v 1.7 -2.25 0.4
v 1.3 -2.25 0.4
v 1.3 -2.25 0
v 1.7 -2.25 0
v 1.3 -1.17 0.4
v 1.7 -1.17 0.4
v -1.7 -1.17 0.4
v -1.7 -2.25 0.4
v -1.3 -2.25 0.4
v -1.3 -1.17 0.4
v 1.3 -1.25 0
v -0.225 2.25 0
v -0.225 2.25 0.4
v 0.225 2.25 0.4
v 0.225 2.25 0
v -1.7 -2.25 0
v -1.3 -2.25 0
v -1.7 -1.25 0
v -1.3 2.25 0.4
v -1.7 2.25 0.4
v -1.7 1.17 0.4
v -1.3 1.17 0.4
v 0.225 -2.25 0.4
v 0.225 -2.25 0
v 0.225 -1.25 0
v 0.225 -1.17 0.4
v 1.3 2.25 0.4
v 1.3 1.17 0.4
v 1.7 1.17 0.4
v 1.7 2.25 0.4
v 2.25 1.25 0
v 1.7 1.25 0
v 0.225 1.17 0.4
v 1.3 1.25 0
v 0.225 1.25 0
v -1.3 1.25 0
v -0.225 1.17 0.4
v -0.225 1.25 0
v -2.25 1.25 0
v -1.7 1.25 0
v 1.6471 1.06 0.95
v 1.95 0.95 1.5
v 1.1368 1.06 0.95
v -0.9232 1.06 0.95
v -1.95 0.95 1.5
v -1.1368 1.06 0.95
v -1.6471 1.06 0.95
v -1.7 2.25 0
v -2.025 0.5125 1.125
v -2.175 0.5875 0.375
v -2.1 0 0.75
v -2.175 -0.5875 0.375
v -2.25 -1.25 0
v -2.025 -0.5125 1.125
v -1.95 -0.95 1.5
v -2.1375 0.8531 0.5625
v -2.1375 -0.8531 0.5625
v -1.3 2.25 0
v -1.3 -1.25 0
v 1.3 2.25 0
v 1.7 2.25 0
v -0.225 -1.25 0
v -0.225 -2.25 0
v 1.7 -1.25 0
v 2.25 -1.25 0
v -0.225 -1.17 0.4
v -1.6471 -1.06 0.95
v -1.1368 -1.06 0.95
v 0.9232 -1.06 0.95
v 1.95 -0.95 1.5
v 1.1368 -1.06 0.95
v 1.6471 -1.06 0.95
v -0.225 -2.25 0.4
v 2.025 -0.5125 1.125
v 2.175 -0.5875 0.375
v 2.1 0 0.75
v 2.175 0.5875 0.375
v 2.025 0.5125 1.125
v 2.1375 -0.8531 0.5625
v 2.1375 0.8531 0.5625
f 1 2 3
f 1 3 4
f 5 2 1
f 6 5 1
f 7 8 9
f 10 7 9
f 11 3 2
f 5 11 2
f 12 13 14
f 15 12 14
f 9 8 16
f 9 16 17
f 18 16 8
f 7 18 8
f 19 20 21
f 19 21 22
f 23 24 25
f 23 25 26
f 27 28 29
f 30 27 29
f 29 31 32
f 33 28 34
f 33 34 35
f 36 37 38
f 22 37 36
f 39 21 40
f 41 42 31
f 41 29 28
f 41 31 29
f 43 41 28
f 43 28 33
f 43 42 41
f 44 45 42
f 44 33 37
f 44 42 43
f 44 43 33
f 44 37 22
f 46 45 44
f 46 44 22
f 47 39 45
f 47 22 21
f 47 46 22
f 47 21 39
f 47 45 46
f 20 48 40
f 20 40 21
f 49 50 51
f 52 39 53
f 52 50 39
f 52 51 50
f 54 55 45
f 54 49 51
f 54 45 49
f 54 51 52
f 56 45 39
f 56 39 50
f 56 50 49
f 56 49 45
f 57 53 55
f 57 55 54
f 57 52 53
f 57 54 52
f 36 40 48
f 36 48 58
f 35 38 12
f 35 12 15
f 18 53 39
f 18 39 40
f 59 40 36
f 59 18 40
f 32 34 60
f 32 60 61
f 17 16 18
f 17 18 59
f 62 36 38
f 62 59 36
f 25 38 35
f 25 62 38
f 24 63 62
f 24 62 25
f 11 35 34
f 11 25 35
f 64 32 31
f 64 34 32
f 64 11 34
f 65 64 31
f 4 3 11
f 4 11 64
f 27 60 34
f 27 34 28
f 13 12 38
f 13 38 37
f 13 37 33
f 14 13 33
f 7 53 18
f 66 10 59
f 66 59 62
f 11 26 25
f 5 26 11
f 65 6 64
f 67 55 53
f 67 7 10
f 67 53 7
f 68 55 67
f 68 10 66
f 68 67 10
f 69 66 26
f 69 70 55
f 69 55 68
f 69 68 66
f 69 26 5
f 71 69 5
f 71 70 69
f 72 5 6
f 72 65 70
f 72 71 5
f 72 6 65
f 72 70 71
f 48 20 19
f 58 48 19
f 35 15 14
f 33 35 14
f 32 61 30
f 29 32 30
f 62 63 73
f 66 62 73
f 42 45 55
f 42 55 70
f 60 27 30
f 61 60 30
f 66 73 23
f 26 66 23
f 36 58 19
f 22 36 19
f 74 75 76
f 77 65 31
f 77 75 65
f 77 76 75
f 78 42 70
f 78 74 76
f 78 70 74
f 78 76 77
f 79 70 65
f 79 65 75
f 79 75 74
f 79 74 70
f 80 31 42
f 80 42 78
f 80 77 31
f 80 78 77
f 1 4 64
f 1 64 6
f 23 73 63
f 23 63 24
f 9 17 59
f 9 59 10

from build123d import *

# Parameters (mm, degrees)
SKETCH_W      = 4.5
SKETCH_H      = 2.5
SKETCH001_W   = 3.9
SKETCH001_H   = 1.9
SKETCH002_W   = 0.4
SKETCH002_H   = 0.4
SKETCH002_W_2 = 0.45
PAD_DEPTH     = 4.5


with BuildPart() as part:
    # Sketch → AdditiveLoft section 0
    with BuildSketch(Plane.XY):
        Rectangle(SKETCH_W, SKETCH_H)
    # Sketch001 (on DatumPlane) → AdditiveLoft section 1
    with BuildSketch(Plane.XY.offset(1.5)):
        Rectangle(SKETCH001_W, SKETCH001_H)
    loft()

    # Sketch002 (on DatumPlane) → Pad (new body)
    with BuildSketch(Plane.XZ.offset(2.25)):
        with Locations((-1.5, 0.2)):
            Rectangle(SKETCH002_W, SKETCH002_H)
        with Locations((1.5, 0.2)):
            Rectangle(SKETCH002_W, SKETCH002_H)
        with Locations((0, 0.2)):
            Rectangle(SKETCH002_W_2, SKETCH002_H)
    extrude(amount=-PAD_DEPTH)


solid = part.part
